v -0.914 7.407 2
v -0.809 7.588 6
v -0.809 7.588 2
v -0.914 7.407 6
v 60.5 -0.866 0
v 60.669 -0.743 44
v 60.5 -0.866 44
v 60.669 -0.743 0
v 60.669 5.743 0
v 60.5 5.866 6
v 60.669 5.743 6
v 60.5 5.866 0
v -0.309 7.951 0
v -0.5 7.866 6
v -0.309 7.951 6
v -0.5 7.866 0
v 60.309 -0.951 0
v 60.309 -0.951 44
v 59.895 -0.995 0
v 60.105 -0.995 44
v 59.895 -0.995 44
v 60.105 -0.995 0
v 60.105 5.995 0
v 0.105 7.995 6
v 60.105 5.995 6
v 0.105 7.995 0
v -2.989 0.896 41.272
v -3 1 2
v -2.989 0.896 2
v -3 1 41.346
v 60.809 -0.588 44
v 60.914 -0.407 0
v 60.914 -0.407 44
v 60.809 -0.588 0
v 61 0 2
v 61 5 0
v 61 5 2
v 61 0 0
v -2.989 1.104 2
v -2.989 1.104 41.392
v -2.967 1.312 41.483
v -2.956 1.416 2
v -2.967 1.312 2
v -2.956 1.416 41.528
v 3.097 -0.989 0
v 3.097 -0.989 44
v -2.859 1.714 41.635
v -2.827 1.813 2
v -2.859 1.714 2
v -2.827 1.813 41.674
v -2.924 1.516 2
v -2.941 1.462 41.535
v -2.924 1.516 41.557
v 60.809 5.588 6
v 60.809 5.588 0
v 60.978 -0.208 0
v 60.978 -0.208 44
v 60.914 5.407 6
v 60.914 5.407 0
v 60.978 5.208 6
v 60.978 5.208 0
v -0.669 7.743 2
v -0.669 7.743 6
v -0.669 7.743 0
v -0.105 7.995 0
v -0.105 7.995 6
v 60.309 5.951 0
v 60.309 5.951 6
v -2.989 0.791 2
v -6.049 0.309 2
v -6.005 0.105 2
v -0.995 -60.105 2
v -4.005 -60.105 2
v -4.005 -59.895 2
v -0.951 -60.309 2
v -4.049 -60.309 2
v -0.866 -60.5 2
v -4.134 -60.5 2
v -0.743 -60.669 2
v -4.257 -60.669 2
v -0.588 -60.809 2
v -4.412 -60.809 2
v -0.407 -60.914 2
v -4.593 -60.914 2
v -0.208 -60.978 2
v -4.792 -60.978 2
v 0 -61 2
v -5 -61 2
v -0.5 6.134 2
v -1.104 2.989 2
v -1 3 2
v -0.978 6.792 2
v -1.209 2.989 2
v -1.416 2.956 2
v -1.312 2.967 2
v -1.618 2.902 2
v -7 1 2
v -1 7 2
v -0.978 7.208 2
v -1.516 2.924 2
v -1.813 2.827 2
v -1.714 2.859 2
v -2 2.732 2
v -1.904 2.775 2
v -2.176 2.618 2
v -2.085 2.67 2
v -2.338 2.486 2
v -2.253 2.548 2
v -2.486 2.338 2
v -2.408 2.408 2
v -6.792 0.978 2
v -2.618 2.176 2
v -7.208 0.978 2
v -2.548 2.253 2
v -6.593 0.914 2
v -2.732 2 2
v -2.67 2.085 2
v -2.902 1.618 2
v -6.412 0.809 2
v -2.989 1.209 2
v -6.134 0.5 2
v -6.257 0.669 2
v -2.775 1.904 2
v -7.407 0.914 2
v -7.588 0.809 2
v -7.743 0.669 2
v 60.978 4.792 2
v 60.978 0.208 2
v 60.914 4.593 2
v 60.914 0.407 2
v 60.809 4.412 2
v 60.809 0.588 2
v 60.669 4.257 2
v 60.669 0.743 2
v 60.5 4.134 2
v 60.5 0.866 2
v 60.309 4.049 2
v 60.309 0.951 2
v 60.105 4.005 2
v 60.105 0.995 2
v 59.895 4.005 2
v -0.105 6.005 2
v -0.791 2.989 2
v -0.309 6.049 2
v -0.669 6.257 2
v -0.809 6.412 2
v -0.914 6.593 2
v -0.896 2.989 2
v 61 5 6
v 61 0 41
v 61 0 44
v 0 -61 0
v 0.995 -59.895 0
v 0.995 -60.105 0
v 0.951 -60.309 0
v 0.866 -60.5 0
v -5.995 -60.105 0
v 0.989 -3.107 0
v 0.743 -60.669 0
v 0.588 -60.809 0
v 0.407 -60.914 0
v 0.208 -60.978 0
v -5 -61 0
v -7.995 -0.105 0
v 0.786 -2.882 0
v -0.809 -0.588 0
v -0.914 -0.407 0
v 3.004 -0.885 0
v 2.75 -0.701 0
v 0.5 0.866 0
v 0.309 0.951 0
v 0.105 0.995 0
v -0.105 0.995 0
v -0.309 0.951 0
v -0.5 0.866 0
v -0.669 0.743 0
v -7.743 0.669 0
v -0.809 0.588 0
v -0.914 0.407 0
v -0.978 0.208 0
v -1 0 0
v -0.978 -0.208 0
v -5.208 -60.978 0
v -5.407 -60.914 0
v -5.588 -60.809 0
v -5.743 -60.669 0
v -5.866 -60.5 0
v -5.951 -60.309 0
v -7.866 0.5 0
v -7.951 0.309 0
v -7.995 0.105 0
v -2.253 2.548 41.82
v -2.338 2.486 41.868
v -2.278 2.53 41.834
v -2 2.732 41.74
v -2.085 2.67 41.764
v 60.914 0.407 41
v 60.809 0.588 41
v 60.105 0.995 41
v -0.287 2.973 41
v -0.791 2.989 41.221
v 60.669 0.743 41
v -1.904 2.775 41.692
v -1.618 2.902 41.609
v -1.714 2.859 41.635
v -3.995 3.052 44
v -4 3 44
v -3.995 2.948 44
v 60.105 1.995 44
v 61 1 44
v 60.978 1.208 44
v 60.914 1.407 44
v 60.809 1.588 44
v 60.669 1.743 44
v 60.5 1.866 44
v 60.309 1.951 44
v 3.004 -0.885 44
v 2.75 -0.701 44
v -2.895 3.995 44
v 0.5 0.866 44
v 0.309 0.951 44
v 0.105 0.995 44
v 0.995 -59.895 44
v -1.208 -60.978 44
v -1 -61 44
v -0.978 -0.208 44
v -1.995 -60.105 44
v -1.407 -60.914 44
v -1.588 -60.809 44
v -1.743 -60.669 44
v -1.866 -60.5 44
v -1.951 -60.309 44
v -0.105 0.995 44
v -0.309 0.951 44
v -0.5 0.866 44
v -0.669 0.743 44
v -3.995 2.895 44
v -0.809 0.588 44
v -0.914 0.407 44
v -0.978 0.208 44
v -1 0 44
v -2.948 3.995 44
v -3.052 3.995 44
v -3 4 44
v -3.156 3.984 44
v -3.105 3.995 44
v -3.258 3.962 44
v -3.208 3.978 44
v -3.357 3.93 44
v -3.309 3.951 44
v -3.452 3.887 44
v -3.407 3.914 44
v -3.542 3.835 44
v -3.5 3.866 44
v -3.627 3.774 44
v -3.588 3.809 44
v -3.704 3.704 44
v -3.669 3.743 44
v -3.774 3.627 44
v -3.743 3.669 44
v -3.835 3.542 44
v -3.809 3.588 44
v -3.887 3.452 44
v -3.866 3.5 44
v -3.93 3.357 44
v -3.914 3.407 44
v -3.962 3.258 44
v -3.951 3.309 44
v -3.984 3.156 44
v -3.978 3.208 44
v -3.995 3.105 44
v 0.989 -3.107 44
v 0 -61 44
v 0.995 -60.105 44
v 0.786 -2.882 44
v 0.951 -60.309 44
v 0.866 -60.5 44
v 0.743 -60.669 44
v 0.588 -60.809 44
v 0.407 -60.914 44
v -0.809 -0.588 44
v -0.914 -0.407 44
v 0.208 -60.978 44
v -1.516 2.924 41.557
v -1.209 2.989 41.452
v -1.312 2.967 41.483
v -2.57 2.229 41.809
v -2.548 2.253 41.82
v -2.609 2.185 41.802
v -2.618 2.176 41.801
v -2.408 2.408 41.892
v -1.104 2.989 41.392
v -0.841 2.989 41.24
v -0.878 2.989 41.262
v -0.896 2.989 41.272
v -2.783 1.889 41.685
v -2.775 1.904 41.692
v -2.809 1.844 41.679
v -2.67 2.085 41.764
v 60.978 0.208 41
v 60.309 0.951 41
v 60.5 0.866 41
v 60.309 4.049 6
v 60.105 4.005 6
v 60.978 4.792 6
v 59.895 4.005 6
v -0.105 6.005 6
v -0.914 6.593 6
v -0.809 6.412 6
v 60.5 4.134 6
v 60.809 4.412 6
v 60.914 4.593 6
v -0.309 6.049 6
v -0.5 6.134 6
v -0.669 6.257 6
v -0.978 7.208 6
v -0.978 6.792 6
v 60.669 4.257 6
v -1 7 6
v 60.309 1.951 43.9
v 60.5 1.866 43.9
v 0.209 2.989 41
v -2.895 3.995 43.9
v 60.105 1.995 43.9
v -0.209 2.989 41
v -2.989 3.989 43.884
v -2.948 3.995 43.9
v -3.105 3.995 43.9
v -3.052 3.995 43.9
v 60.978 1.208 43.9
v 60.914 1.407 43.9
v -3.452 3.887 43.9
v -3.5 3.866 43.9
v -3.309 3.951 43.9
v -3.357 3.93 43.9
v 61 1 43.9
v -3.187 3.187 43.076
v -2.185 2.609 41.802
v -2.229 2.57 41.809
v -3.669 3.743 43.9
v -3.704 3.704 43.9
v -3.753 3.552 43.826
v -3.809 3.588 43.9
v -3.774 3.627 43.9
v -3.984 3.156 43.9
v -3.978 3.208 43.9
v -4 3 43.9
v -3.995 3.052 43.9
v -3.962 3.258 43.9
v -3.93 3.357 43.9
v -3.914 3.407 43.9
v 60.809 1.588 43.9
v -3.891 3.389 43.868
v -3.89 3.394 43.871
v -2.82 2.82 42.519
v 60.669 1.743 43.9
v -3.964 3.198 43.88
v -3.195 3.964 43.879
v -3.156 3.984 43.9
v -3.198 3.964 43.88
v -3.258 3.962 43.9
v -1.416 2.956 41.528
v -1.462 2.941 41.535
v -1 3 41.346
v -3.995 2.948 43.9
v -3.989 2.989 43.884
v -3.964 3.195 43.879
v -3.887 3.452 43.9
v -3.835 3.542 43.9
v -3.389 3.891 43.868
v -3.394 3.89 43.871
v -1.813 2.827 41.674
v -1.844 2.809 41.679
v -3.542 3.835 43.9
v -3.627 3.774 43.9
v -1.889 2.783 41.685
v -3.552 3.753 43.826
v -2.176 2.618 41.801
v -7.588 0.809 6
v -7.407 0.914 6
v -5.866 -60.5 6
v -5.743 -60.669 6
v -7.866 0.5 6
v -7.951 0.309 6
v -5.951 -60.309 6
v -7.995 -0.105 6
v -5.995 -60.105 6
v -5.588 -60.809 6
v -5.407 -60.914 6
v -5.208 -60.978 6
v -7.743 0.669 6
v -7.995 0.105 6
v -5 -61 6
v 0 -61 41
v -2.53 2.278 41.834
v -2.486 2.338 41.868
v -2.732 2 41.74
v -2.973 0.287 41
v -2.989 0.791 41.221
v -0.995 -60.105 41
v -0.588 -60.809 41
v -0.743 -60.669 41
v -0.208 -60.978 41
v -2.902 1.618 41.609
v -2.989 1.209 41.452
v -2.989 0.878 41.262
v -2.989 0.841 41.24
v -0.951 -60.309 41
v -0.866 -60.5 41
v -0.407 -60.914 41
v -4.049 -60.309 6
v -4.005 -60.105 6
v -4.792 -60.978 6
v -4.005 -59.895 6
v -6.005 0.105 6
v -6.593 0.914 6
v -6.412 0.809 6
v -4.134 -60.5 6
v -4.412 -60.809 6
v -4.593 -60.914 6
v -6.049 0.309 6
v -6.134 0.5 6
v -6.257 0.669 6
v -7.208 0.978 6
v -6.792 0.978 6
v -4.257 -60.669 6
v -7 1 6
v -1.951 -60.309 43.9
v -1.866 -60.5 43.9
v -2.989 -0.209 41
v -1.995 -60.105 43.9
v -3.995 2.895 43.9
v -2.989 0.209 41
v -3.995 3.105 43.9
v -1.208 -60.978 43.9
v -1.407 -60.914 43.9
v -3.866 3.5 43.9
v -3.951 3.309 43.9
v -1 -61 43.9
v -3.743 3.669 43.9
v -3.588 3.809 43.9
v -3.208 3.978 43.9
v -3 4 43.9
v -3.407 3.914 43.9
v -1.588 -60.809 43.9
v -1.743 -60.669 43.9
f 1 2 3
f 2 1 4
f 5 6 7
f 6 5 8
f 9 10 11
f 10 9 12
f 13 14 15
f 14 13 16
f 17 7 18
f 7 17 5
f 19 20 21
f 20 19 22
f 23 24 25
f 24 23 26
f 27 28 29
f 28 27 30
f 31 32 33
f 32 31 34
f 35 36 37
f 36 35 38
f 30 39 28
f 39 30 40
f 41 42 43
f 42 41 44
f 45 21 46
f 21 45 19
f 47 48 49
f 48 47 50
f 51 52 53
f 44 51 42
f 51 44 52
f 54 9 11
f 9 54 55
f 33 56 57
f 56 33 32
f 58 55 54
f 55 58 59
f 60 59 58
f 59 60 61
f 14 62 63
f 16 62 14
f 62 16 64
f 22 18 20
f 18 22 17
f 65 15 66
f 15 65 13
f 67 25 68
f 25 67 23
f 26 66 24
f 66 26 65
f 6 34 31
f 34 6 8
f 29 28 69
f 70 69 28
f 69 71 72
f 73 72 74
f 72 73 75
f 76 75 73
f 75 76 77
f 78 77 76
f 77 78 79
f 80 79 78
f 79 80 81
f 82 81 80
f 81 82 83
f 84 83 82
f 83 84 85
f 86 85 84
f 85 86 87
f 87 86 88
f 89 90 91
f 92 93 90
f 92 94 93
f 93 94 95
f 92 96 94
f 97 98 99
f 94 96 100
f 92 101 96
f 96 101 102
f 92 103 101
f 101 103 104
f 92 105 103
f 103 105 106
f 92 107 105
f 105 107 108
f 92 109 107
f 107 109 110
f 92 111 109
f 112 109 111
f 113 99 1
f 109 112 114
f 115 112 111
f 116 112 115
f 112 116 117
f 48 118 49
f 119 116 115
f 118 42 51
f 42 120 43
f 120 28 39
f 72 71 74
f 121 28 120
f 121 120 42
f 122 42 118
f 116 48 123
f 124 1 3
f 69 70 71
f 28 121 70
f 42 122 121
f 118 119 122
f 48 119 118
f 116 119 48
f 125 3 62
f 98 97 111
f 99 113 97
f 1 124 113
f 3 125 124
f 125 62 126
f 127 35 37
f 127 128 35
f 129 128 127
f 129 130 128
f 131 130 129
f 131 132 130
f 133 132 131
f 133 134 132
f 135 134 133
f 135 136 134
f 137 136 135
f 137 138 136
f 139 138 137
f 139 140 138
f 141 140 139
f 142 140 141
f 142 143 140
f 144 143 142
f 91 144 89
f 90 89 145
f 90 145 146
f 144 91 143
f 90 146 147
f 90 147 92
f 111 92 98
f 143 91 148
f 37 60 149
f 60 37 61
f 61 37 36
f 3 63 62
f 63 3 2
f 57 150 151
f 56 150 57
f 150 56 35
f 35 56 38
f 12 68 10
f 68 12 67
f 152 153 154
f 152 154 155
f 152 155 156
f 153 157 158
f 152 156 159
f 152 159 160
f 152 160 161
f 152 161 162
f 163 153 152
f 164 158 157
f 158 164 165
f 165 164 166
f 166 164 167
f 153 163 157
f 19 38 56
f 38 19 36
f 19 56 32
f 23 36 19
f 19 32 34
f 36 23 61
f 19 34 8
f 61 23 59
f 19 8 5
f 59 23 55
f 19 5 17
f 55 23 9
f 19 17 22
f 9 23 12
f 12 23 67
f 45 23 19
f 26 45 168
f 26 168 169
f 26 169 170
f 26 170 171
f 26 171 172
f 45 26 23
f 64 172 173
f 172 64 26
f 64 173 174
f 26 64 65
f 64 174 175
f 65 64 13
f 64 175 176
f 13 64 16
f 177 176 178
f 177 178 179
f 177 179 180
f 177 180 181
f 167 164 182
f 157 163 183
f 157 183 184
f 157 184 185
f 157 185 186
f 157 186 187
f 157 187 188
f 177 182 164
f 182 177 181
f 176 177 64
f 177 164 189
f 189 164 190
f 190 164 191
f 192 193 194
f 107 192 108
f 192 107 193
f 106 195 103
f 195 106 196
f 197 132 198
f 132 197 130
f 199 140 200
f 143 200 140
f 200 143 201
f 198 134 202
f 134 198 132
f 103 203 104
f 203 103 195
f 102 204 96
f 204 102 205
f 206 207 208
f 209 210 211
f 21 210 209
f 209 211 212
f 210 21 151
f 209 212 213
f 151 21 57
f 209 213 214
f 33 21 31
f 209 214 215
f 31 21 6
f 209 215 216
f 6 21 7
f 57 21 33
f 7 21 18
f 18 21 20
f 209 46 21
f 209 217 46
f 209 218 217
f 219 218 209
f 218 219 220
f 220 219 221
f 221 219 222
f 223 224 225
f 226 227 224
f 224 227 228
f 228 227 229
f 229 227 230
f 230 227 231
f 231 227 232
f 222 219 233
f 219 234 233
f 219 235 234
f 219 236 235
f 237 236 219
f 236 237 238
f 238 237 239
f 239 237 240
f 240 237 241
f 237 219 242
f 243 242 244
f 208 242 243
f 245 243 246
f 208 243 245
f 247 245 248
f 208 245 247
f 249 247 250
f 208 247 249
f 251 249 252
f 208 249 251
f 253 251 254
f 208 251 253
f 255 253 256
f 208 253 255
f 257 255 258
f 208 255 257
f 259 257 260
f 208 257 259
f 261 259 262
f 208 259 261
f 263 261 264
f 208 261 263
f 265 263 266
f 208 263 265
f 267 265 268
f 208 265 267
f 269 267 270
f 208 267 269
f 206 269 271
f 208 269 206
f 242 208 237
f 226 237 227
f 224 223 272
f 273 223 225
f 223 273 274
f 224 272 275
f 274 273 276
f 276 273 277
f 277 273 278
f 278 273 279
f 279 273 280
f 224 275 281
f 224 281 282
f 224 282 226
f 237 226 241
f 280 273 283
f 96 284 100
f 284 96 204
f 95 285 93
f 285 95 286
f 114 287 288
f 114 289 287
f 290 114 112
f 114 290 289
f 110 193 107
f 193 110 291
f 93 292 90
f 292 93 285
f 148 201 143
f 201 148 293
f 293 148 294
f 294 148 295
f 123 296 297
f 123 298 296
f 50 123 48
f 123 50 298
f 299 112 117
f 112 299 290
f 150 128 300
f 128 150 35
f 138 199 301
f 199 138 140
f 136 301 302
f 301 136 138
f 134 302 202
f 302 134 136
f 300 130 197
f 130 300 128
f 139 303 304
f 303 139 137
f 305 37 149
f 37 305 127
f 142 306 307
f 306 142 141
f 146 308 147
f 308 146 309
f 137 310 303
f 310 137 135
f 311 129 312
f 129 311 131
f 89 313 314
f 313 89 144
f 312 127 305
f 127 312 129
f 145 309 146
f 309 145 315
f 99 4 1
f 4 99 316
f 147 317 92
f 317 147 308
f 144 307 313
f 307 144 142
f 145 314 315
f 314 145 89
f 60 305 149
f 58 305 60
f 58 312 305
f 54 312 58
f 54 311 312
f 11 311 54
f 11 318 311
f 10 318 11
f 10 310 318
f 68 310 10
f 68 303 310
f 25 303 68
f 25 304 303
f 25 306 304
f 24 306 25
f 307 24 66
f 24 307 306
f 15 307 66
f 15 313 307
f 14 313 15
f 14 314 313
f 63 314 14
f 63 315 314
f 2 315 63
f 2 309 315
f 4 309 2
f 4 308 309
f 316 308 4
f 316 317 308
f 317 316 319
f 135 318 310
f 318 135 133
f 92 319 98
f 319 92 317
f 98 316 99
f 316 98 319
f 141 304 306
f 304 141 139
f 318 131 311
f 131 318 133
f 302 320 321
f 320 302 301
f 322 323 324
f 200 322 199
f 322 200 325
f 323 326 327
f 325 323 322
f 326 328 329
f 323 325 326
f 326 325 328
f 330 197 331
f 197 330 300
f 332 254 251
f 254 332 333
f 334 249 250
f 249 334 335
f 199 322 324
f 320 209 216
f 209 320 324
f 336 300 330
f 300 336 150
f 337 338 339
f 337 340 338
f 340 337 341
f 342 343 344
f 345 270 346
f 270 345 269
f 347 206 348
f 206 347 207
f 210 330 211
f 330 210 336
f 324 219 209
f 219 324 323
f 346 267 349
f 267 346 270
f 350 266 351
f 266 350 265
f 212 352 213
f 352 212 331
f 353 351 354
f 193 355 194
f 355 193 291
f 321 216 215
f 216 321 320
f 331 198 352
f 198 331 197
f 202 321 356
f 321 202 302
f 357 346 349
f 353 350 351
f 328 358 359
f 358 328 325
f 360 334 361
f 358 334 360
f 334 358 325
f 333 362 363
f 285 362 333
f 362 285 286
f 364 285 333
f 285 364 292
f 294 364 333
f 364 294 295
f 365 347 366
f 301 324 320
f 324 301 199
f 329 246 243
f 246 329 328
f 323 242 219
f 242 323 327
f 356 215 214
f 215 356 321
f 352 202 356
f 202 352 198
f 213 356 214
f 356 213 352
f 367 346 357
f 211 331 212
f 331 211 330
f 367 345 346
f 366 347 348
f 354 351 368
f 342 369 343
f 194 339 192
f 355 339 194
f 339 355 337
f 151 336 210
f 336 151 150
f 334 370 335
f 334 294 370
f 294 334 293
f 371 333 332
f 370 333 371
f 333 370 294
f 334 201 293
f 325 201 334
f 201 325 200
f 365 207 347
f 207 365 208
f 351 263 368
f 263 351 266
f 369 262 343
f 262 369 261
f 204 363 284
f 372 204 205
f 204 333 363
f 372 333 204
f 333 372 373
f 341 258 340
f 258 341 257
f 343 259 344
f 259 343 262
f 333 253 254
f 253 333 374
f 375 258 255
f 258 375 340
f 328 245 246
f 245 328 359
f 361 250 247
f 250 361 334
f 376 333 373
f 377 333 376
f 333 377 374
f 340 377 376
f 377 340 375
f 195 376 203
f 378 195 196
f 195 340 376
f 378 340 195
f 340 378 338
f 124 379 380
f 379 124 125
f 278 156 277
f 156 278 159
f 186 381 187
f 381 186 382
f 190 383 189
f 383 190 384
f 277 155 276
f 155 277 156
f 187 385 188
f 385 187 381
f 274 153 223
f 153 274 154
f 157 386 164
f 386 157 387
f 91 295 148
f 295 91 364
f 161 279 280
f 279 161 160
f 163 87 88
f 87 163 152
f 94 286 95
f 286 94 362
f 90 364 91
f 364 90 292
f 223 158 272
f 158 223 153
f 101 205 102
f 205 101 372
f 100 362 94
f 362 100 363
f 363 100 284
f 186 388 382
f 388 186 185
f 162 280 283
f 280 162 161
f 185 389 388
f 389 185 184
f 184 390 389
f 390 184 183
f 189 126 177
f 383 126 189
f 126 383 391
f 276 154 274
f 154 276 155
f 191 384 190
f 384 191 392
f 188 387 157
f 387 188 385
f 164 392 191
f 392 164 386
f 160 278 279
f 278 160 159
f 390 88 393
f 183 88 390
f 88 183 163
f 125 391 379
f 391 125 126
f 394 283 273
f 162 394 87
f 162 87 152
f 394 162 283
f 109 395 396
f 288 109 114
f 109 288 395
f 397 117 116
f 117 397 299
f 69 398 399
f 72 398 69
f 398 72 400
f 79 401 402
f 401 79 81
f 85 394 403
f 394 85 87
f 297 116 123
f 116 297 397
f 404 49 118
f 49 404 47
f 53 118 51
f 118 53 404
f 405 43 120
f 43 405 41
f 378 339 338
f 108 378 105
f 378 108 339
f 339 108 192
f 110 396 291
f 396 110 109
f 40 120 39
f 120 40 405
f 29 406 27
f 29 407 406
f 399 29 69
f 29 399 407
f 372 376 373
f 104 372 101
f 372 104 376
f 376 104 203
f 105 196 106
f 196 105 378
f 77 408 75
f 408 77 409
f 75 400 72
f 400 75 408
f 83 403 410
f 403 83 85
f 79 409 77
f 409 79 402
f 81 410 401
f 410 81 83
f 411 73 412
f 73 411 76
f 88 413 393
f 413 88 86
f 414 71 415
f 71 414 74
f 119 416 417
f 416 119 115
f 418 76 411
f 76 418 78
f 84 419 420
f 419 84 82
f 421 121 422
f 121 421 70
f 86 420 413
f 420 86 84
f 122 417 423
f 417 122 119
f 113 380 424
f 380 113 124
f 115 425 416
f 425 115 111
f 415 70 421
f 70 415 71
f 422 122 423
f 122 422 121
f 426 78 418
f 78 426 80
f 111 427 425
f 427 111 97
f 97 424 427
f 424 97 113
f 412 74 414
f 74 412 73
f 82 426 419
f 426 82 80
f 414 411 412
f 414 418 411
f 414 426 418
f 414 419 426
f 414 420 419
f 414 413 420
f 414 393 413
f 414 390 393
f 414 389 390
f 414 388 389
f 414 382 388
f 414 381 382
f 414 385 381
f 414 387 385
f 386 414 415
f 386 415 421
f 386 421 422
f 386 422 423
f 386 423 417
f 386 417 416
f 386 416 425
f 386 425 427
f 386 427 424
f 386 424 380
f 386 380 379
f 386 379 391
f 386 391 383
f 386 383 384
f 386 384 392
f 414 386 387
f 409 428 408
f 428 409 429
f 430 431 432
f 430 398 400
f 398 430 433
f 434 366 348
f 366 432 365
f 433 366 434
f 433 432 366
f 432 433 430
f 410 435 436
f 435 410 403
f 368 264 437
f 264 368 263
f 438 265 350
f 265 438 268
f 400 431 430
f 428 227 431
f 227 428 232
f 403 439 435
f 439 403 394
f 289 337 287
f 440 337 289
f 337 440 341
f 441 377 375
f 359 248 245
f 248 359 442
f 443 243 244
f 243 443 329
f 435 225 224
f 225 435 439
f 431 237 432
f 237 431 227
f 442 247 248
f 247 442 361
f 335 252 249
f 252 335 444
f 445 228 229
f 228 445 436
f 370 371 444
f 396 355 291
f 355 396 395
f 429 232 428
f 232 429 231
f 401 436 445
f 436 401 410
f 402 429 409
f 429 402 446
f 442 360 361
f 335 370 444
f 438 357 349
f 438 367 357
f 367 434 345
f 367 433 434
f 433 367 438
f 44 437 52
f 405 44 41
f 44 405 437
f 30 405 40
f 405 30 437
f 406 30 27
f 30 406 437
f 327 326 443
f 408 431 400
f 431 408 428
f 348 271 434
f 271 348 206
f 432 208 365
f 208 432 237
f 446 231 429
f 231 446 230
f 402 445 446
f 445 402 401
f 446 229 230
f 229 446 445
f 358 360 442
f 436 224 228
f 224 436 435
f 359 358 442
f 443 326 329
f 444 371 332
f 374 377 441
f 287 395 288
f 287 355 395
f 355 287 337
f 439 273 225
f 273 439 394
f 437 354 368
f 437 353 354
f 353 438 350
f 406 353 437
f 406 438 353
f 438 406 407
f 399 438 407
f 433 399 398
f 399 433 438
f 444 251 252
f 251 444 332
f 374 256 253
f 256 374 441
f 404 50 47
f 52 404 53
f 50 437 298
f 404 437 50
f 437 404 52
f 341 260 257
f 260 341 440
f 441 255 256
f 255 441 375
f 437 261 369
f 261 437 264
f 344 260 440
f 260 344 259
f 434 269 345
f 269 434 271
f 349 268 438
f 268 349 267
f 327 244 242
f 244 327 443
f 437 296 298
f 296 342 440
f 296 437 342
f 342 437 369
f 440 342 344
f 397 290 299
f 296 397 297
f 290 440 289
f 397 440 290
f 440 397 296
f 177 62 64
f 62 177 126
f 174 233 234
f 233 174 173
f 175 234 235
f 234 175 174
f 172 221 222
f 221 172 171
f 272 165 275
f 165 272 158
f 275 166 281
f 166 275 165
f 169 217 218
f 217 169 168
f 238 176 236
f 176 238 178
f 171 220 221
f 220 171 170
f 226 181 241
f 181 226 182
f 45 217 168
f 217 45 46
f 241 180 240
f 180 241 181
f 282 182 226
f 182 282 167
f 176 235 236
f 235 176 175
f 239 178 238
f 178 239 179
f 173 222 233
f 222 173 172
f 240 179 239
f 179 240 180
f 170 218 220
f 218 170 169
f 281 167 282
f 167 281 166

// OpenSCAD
// How wide is the strap and any extra play you want added
StrapWidth = 40;
// Space for the gap for the hook to hold the clamp corner on the strap
StrapThickness = 3;

// Minimum Thickness of the clamp corner body. It will be twice as thick in the corner
ClampThickness = 2;
// How long to make the clamp from corner to end
ClampLength = 60 ;

// Angle too be clamped
ClampAngle = 90;



difference()
{
	CornerBracket();
	// Make a spot for the glue to sqeeze out
	hull()
	{	
		cylinder(h = StrapWidth + ClampThickness * 2, r=ClampThickness * .5 , $fs=0.01);	
		translate([ClampThickness  , -ClampThickness   , 0]) cylinder(h = StrapWidth + ClampThickness * 2, r=ClampThickness * .75 , $fs=0.01);	
	}


}

module CornerBracket()
{
	frame();
	rotate(a = ClampAngle, v = [ 0, 0, -1]) mirror([0, 1, 0]) frame();
	
	hull ()
	{
		OutsideCorner();
		rotate(a = ClampAngle, v = [ 0, 0, -1]) mirror([0, 1, 0]) OutsideCorner();
	}
}		

module frame ()
{
 	//Base
     hull(){
		translate(v = [ClampLength, 0, 0]) cylinder(h = ClampThickness, r=ClampThickness * .5, $fs=0.01);
		translate(v = [-ClampThickness * .5, ClampThickness * .5, 0]) cylinder(h = ClampThickness, r=ClampThickness , $fs=0.01);	
		translate(v = [0,  (ClampThickness  * 2 + StrapThickness)  , 0])  cylinder(h = ClampThickness , r=ClampThickness * .5 , $fs=0.01);
		translate(v = [ClampLength,  (ClampThickness + StrapThickness) , 0])  cylinder(h = ClampThickness , r=ClampThickness * .5, $fs=0.01);
	}

       //Sides
	hull(){
		// Narrow side
		translate(v = [ClampLength, 0, 0]) cylinder(h = StrapWidth + ClampThickness * 2, r=ClampThickness * .5, $fs=0.01);
		// Wide side
		translate(v = [-ClampThickness * .5, ClampThickness * .5, 0]) cylinder(h = StrapWidth + ClampThickness * 2, r=ClampThickness , $fs=0.01);	
	}
	//Short Side
	hull(){
		translate(v = [0,  (ClampThickness  * 2 + StrapThickness)  , 0])  cylinder(h = StrapWidth * .1 + ClampThickness , r=ClampThickness  * .5, $fs=0.01);
		translate(v = [ClampLength,  (ClampThickness + StrapThickness) , 0])  cylinder(h = StrapWidth * .1 + ClampThickness , r=ClampThickness * .5, $fs=0.01);
	}
	//Upper step Side
	hull(){
		// inline part
		translate(v = [0,  ClampThickness *.5  , StrapWidth + ClampThickness * 2 - StrapThickness])  cylinder(h = StrapThickness , r=ClampThickness , $fs=0.01);
		translate(v = [ClampLength,  0  , StrapWidth + ClampThickness * 2 - StrapThickness])  cylinder(h = StrapThickness , r=ClampThickness * .5, $fs=0.01);
		// Outside step part
		translate(v = [-ClampThickness * 1.5,  ClampThickness * 1.5 , StrapWidth + ClampThickness * 2 - .1])  cylinder(h = .1 , r=ClampThickness  * .5, $fs=0.01);
		translate(v = [ClampLength,  ClampThickness *.5  , StrapWidth + ClampThickness * 2 - .1])  cylinder(h = .1 , r=ClampThickness * .5, $fs=0.01);
	}
}

module OutsideCorner()
{
	cylinder(h = ClampThickness, r=ClampThickness * .5 , $fs=0.01);	
	translate(v = [0,  (ClampThickness  * 2 + StrapThickness)  , 0])  cylinder(h = ClampThickness , r=ClampThickness * .5 , $fs=0.01);
}
